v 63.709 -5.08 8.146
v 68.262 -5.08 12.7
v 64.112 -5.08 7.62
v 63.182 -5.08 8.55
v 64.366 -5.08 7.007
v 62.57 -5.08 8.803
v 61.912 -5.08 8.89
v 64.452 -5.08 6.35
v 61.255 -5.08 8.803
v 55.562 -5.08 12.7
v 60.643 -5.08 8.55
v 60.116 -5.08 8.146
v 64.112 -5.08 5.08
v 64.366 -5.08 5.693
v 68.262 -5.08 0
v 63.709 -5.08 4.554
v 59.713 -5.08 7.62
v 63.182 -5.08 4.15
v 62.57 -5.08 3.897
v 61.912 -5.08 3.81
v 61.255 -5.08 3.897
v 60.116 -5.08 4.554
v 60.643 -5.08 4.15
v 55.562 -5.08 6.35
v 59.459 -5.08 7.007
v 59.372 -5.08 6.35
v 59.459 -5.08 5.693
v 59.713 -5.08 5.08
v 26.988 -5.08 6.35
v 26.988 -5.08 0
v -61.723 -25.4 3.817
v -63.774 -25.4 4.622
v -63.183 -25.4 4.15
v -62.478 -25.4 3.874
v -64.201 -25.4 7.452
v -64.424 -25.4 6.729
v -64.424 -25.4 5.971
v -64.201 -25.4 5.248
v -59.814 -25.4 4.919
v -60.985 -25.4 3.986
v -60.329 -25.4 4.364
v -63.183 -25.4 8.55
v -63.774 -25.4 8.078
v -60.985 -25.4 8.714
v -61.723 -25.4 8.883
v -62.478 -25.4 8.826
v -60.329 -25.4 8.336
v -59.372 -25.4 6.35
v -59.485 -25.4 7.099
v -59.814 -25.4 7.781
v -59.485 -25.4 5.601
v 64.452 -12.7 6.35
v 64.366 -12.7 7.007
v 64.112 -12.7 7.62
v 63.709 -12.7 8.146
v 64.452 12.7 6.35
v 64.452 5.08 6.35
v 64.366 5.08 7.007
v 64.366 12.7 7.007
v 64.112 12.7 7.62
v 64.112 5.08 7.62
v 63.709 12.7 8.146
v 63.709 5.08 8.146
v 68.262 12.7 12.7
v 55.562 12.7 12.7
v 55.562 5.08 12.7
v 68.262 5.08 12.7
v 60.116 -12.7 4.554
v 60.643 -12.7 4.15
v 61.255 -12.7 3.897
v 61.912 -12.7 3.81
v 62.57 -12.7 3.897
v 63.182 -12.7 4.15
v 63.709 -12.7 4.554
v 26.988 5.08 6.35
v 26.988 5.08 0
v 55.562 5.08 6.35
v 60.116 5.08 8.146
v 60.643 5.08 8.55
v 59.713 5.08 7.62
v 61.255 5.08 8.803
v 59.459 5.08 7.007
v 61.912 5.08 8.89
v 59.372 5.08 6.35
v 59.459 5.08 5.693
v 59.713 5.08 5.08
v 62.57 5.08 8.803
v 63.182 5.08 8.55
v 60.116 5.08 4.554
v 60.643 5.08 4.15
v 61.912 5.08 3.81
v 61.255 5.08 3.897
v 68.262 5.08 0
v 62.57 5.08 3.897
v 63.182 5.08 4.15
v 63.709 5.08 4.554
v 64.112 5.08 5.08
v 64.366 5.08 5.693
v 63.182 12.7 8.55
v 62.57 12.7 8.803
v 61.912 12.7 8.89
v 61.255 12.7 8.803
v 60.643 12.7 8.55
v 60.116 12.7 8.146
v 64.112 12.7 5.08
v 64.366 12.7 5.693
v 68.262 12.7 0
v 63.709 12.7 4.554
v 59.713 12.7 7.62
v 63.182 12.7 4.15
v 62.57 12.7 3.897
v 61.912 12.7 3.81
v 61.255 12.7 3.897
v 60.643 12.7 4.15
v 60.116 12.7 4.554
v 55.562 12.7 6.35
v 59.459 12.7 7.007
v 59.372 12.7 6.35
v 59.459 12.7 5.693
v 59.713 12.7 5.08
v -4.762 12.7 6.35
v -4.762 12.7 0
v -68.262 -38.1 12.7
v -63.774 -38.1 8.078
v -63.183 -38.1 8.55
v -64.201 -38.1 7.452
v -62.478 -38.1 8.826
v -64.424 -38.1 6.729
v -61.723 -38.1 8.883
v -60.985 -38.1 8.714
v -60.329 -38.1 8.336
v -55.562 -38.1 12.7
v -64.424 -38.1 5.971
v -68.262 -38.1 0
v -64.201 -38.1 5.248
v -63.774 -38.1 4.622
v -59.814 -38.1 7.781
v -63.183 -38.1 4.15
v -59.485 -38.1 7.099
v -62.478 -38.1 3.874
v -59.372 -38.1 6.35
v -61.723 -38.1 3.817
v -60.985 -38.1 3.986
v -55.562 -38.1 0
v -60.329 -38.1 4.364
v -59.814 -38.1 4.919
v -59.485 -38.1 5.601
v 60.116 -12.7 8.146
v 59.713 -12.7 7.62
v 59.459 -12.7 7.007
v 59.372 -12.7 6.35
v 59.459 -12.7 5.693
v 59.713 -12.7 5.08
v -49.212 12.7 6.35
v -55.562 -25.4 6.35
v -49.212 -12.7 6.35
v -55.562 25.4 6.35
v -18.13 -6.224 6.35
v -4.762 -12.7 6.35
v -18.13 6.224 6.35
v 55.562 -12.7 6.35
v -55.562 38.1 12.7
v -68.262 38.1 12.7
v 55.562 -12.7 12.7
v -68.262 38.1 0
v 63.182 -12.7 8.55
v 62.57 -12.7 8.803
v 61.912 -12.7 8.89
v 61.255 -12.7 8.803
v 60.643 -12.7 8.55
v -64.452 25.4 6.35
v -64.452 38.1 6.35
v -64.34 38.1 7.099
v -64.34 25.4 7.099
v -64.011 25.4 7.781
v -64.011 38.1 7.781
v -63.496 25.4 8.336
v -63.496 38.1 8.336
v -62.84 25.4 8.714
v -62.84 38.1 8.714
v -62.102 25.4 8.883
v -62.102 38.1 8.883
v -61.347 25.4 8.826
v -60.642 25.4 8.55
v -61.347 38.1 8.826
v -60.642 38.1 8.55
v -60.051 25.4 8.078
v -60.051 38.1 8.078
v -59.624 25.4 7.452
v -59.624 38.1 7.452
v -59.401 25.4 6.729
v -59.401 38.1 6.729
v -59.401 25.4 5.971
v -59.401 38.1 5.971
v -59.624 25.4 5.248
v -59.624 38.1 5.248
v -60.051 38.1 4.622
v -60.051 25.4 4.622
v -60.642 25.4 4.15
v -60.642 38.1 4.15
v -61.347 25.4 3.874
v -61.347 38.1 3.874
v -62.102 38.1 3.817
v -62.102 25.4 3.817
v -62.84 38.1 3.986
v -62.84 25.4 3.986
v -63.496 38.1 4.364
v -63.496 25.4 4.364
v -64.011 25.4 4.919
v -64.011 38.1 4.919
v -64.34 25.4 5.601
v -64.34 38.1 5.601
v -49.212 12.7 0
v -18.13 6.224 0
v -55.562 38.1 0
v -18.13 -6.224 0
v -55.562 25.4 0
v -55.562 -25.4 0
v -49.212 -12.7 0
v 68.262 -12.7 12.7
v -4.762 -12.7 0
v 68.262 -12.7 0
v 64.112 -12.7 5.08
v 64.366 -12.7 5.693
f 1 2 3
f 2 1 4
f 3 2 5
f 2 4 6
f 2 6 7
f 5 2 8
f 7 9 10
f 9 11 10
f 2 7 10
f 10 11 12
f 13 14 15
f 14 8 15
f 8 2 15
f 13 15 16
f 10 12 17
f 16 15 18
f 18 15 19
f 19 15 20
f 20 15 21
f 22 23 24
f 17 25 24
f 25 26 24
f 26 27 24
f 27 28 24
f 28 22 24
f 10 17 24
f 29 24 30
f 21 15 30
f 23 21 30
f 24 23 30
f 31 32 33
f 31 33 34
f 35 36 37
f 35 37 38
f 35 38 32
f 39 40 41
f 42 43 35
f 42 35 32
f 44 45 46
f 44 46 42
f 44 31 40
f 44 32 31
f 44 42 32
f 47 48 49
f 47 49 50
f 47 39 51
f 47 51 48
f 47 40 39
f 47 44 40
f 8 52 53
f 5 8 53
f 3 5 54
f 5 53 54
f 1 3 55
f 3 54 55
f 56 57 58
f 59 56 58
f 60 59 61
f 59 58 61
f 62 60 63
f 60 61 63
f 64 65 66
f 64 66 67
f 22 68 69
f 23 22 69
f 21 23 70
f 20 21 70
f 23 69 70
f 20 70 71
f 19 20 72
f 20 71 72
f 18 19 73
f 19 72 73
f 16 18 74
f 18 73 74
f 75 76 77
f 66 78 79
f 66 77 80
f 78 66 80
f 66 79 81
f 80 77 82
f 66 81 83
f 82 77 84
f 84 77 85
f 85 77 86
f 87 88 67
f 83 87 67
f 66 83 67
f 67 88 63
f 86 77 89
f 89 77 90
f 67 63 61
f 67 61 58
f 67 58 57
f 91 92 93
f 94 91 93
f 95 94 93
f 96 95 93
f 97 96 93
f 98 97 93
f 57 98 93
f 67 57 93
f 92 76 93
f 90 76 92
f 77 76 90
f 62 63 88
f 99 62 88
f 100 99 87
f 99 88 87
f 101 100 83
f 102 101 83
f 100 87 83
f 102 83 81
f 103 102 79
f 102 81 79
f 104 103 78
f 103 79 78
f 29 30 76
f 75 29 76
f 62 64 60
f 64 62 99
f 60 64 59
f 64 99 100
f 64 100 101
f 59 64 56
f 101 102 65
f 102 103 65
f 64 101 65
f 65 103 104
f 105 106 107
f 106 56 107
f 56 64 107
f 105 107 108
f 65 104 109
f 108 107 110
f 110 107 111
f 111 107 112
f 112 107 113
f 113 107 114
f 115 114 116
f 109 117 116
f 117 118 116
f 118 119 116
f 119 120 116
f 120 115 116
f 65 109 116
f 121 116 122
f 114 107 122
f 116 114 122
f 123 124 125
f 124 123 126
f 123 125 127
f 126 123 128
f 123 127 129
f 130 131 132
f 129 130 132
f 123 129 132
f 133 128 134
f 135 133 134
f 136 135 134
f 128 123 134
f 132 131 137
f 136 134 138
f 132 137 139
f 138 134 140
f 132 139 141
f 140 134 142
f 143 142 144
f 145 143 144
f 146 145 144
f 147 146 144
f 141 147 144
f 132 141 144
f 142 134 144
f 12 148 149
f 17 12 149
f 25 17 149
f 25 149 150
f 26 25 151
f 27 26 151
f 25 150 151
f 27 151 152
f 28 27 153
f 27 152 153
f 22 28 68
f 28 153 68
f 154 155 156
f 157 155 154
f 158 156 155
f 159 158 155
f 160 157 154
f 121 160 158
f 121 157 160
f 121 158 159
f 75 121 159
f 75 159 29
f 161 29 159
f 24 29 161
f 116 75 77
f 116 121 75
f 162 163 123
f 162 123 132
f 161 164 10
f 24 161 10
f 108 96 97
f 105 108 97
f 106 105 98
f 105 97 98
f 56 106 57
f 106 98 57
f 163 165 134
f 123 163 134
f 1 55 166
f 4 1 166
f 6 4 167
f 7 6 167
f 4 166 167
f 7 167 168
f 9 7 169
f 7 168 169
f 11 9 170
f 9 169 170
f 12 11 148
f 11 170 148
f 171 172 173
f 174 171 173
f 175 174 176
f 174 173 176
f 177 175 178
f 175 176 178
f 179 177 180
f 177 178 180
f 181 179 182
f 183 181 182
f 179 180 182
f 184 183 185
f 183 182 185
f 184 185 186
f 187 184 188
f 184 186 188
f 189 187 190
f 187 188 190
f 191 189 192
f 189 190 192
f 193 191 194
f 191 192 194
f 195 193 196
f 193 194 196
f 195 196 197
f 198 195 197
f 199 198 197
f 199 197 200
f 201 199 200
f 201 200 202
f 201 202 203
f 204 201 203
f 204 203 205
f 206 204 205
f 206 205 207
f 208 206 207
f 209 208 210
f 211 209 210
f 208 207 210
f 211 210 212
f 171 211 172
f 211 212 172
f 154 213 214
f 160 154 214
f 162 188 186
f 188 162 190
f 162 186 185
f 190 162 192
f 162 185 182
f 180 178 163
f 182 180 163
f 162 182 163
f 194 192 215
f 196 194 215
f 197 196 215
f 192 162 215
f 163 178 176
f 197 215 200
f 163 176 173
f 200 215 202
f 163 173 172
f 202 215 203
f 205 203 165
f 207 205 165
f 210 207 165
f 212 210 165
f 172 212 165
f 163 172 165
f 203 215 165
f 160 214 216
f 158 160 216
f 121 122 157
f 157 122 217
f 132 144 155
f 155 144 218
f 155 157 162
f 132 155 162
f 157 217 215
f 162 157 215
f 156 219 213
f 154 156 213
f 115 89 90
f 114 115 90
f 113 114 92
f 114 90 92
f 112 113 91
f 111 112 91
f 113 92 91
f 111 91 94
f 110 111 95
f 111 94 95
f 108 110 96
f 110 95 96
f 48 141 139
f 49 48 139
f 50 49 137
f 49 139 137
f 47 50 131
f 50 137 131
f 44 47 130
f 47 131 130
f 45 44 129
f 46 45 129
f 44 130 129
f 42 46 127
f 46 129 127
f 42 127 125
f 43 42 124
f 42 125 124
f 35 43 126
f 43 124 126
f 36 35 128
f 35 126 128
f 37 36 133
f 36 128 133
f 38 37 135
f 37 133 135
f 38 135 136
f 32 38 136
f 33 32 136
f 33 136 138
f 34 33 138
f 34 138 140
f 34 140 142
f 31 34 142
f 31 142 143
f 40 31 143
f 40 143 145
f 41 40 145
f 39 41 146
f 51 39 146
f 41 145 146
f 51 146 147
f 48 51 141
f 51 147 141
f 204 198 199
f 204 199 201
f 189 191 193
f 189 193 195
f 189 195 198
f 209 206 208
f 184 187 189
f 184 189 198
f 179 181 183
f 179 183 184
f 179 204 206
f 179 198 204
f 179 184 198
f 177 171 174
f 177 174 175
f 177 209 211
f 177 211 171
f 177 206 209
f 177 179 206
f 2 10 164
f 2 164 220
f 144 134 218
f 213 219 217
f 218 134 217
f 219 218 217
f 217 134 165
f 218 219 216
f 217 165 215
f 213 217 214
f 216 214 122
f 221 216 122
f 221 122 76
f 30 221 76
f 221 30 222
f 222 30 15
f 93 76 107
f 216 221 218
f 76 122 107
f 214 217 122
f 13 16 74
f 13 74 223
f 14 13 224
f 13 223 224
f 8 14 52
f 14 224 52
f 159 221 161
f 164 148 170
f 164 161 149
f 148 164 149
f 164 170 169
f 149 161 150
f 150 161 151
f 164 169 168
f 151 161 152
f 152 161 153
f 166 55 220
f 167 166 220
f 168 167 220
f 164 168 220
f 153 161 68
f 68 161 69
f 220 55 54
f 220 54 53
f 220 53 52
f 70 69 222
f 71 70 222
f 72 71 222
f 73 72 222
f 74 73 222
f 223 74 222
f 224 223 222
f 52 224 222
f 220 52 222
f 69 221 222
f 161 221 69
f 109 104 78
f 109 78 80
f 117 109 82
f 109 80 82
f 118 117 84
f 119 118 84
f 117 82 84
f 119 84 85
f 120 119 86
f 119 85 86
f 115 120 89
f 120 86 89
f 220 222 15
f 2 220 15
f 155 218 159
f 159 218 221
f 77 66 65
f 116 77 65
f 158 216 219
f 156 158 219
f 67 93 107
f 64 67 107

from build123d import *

# Parameters (mm, degrees)
F1_DEPTH = 12.7
F3_DEPTH = 6.35
F4_R     = 2.54
F5_DEPTH = 12.7
F7_DEPTH = 76.201
F8_R     = 2.54
F9_DEPTH = 12.7


with BuildPart() as f1:
    # F0 (on Top) → F1 (new body)
    with BuildSketch(Plane.XY):
        Polygon((-68.2625, 38.1), (-68.2625, -38.1), (-55.5625, -38.1), (-55.5625, -25.4), (-4.7625, -12.7), (68.2625, -12.7), (68.2625, -5.08), (26.9875, -5.08), (26.9875, 5.08), (68.2625, 5.08), (68.2625, 12.7), (-4.7625, 12.7), (-55.5625, 25.4), (-55.5625, 38.1), align=None)
        Polygon((-49.2125, -12.7), (-49.2125, 12.7), (-18.1300211438, 6.223735015), (-18.1300211438, -6.223735015), align=None, mode=Mode.SUBTRACT)
    extrude(amount=F1_DEPTH)

    # F2 (on face) → F3 (cut)
    with BuildSketch(Plane.XY.offset(12.7)):
        Polygon((-55.5625, 25.4), (-55.5625, -25.4), (-4.7625, -12.7), (55.5625, -12.7), (55.5625, -5.08), (26.9875, -5.08), (26.9875, 5.08), (55.5625, 5.08), (55.5625, 12.7), (-4.7625, 12.7), align=None)
        Polygon((-49.2125, -12.7), (-49.2125, 12.7), (-18.1300211438, 6.223735015), (-18.1300211438, -6.223735015), align=None, mode=Mode.SUBTRACT)
    extrude(amount=-F3_DEPTH, mode=Mode.SUBTRACT)

    # F4 (on face) → F5 (cut)
    with BuildSketch(Plane.XZ.offset(38.1)):
        with Locations((-61.9125, 6.35)):
            Circle(F4_R)
    extrude(amount=-F5_DEPTH, mode=Mode.SUBTRACT)

    # F6 (on face) → F7 (cut, through all)
    with BuildSketch(Plane.XZ.offset(38.1)):
        with BuildLine():
            Line((61.9125, 6.35), (60.1164487758, 4.5539487758))
            ThreePointArc((60.1164487758, 4.5539487758), (61.9125, 3.81), (63.7085512242, 4.5539487758))
            Line((63.7085512242, 4.5539487758), (61.9125, 6.35))
        make_face()
        with BuildLine():
            Line((61.9125, 6.35), (60.1164487758, 8.1460512242))
            ThreePointArc((60.1164487758, 8.1460512242), (59.3725, 6.35), (60.1164487758, 4.5539487758))
            Line((60.1164487758, 4.5539487758), (61.9125, 6.35))
        make_face()
        with BuildLine():
            ThreePointArc((63.7085512242, 8.1460512242), (61.9125, 8.89), (60.1164487758, 8.1460512242))
            Line((60.1164487758, 8.1460512242), (61.9125, 6.35))
            Line((61.9125, 6.35), (63.7085512242, 8.1460512242))
        make_face()
        with BuildLine():
            ThreePointArc((64.4525, 6.35), (64.2591540126, 7.3220159182), (63.7085512242, 8.1460512242))
            Line((63.7085512242, 8.1460512242), (61.9125, 6.35))
            Line((61.9125, 6.35), (63.7085512242, 4.5539487758))
            ThreePointArc((63.7085512242, 4.5539487758), (64.2591540126, 5.3779840818), (64.4525, 6.35))
        make_face()
    extrude(amount=-F7_DEPTH, mode=Mode.SUBTRACT)

    # F8 (on face) → F9 (cut)
    with BuildSketch(Plane(origin=(0, 38.1, 0), x_dir=(-1, 0, 0), z_dir=(0, 1, 0))):
        with Locations((61.9125, 6.35)):
            Circle(F8_R)
    extrude(amount=-F9_DEPTH, mode=Mode.SUBTRACT)


solid = f1.part
